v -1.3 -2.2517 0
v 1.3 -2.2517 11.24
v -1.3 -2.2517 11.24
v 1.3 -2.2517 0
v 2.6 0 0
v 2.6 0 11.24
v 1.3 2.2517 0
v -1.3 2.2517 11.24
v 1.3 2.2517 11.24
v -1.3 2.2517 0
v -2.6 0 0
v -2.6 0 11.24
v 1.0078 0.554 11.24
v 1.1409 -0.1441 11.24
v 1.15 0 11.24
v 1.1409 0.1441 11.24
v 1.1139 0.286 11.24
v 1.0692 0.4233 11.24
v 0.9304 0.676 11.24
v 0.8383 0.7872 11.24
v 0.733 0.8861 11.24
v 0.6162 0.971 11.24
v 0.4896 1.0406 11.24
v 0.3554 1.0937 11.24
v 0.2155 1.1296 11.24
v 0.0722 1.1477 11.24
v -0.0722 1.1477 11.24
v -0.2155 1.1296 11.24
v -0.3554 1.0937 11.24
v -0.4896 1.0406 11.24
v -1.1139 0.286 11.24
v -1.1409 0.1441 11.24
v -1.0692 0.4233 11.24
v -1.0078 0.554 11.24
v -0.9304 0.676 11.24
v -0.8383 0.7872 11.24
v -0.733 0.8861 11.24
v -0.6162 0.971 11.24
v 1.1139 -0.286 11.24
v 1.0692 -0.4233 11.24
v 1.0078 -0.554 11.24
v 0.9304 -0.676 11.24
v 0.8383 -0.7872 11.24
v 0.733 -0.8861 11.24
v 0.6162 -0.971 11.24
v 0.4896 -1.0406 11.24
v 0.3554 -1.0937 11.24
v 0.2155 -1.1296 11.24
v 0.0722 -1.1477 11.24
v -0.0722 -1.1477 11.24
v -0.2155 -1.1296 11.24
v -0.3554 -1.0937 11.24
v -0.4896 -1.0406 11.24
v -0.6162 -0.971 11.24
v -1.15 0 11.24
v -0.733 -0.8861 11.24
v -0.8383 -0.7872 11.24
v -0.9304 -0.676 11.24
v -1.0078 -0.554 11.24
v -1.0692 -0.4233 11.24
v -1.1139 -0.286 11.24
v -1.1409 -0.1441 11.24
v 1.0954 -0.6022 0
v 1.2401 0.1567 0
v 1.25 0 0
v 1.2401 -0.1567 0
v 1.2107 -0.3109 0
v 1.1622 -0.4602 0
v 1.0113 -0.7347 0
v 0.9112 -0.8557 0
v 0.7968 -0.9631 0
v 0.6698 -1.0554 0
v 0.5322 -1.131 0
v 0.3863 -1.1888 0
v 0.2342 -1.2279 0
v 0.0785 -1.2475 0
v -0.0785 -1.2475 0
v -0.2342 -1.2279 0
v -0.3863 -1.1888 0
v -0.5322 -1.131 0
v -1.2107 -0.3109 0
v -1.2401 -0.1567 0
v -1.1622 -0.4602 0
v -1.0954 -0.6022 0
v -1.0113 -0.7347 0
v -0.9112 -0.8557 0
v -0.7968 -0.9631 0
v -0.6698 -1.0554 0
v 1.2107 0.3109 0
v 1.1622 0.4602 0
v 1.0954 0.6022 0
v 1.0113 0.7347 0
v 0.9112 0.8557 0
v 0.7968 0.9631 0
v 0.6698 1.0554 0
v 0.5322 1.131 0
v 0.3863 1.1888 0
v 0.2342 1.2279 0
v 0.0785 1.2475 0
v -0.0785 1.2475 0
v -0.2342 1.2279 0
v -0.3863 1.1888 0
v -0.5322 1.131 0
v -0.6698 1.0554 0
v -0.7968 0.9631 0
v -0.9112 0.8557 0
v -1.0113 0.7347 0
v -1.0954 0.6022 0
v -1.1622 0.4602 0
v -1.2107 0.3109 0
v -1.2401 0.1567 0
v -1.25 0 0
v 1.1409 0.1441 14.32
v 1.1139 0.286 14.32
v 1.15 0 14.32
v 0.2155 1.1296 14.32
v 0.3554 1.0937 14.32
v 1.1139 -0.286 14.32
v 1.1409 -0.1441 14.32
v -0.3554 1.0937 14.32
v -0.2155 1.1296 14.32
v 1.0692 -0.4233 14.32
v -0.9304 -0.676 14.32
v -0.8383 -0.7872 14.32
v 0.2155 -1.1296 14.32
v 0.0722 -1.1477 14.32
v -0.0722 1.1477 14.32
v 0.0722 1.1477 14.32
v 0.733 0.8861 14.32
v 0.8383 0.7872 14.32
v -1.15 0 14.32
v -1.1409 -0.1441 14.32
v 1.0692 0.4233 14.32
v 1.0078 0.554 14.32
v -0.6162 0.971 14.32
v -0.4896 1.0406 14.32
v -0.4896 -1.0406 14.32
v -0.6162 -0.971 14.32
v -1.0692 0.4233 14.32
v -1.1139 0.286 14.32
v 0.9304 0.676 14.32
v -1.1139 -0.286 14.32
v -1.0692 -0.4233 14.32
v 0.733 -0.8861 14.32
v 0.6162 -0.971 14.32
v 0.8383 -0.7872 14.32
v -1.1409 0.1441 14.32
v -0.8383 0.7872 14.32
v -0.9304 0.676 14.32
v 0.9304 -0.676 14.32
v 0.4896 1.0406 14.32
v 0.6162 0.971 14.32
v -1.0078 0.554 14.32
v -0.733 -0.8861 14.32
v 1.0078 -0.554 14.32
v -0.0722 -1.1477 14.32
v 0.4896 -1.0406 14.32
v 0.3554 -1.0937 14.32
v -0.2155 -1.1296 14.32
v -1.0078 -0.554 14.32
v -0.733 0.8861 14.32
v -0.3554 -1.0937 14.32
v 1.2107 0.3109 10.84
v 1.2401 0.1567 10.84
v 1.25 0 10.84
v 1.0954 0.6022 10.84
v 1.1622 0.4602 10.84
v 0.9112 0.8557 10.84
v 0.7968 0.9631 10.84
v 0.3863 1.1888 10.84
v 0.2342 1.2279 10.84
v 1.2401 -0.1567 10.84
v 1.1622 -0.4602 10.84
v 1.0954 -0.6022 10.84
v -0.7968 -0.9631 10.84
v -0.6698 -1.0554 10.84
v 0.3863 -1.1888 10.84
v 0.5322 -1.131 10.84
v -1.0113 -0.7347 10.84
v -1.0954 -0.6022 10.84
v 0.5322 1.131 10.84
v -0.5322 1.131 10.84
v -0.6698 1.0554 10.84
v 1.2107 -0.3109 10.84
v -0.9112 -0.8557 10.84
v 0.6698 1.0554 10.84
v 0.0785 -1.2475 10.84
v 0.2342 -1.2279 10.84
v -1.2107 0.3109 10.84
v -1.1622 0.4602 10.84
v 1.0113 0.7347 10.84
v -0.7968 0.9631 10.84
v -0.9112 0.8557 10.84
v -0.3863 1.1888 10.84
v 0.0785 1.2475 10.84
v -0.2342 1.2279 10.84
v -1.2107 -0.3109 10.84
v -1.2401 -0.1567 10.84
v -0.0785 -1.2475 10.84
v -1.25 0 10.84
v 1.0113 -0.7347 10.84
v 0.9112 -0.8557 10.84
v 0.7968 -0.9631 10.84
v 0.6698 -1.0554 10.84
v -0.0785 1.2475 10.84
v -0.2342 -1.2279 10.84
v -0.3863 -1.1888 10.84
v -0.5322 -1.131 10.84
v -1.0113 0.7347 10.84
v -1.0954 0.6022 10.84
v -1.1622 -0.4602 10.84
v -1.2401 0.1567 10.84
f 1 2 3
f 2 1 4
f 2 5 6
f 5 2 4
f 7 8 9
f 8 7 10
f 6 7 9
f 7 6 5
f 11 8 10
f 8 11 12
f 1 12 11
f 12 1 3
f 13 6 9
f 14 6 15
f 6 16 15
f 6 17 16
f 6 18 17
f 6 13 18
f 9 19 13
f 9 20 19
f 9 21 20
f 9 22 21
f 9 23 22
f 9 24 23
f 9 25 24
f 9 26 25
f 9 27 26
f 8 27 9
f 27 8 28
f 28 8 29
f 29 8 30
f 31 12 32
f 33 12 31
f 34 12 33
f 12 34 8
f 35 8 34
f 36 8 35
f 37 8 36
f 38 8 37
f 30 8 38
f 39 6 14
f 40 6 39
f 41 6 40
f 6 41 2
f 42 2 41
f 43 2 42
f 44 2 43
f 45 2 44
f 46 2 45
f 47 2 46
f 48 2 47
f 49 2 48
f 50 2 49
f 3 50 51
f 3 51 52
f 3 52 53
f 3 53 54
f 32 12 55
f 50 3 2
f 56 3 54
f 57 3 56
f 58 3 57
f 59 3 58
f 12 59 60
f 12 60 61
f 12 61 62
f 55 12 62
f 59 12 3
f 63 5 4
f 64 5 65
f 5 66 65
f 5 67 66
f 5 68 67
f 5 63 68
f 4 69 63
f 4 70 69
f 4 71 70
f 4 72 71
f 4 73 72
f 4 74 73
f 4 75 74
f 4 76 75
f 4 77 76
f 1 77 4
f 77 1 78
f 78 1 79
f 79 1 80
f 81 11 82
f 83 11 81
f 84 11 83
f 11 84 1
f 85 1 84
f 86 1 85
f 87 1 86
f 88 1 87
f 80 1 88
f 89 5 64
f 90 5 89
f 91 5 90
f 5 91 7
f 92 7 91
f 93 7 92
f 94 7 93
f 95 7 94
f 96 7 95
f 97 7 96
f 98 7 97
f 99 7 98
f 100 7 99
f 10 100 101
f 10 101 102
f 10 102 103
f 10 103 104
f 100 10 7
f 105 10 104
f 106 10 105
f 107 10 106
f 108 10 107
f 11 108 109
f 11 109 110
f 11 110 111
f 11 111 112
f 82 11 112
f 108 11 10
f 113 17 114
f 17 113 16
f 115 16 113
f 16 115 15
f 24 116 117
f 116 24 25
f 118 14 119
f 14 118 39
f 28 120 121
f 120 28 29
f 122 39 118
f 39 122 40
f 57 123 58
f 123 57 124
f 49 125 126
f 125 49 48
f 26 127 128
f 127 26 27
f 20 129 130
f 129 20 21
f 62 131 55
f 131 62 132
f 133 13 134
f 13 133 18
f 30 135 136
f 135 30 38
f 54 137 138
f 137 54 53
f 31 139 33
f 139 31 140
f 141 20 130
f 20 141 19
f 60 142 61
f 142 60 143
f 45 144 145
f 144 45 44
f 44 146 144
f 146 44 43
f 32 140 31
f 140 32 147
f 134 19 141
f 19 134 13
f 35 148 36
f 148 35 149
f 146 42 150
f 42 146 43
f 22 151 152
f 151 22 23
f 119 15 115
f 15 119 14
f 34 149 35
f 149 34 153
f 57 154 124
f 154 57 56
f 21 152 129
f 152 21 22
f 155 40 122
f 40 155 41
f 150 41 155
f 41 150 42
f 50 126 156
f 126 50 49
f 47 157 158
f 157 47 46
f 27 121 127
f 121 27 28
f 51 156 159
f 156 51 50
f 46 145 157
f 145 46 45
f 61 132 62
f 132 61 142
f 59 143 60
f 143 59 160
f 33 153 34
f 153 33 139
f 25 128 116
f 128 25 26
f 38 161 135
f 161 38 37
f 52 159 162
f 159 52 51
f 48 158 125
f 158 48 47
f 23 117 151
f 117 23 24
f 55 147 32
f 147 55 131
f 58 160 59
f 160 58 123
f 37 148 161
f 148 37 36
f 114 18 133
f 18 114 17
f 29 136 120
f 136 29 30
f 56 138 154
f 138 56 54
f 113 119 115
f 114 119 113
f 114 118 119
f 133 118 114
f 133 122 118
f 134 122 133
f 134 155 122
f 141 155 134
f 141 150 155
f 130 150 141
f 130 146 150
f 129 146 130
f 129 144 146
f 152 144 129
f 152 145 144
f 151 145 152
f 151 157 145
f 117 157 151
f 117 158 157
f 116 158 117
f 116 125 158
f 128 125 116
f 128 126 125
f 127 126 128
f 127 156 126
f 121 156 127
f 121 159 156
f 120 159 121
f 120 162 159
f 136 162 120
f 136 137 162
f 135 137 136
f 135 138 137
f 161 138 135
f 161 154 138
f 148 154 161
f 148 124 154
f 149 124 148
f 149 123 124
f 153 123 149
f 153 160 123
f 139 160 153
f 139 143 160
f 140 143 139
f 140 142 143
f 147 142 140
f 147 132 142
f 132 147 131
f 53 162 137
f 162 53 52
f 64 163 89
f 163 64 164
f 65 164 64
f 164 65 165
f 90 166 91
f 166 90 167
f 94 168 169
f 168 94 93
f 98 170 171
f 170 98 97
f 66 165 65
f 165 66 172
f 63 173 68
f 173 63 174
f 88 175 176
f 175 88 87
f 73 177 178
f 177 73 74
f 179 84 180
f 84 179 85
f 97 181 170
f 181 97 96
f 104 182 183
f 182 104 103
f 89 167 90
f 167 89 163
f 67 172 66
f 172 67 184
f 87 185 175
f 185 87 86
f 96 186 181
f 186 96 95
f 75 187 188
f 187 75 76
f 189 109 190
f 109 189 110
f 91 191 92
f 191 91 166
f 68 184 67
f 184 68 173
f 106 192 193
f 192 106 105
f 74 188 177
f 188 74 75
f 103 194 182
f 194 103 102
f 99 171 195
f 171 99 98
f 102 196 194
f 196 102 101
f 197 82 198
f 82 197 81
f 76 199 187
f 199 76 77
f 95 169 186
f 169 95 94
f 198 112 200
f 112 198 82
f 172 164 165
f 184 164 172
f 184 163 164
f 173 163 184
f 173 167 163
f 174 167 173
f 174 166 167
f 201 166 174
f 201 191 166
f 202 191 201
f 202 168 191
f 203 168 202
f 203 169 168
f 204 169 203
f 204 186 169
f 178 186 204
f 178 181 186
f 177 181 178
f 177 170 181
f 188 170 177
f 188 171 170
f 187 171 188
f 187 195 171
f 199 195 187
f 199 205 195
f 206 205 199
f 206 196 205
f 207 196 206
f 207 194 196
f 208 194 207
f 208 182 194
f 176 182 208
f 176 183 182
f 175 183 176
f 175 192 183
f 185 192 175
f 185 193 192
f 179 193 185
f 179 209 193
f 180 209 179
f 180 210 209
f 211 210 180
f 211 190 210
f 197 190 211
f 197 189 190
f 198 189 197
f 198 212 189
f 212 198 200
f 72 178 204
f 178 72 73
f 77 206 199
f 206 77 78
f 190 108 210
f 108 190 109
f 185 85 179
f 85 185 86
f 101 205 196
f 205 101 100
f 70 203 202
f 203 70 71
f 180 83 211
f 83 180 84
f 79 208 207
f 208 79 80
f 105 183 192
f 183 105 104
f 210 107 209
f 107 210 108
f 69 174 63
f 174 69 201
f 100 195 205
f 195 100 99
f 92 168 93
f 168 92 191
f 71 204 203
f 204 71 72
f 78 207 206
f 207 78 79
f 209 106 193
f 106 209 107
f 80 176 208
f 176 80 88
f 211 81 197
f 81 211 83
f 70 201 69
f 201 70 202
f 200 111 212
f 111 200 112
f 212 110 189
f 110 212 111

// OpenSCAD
// cylinders to hold the screens on the EMMG midi workshop device v2
// units are mm

$fn=50;

height = 11.24;
external_diameter = 2.6;
internal_diameter = 2.3/2;
screw_hole_diameter = 1.25;
margins = 0.1;
board_height = 1.54*2; // we want the nut as well so we can crunch it


module main_body() {
    cylinder(height, external_diameter, external_diameter, $fn=6);
}
module peg() {
    translate([0,0,height])
    cylinder(board_height, internal_diameter, internal_diameter);
}

module hole() {
    translate([0,0,-margins]) cylinder(height-3*margins, screw_hole_diameter, screw_hole_diameter);
}

difference() {
    union() {
        main_body();
        peg();
    }
    hole();
}
